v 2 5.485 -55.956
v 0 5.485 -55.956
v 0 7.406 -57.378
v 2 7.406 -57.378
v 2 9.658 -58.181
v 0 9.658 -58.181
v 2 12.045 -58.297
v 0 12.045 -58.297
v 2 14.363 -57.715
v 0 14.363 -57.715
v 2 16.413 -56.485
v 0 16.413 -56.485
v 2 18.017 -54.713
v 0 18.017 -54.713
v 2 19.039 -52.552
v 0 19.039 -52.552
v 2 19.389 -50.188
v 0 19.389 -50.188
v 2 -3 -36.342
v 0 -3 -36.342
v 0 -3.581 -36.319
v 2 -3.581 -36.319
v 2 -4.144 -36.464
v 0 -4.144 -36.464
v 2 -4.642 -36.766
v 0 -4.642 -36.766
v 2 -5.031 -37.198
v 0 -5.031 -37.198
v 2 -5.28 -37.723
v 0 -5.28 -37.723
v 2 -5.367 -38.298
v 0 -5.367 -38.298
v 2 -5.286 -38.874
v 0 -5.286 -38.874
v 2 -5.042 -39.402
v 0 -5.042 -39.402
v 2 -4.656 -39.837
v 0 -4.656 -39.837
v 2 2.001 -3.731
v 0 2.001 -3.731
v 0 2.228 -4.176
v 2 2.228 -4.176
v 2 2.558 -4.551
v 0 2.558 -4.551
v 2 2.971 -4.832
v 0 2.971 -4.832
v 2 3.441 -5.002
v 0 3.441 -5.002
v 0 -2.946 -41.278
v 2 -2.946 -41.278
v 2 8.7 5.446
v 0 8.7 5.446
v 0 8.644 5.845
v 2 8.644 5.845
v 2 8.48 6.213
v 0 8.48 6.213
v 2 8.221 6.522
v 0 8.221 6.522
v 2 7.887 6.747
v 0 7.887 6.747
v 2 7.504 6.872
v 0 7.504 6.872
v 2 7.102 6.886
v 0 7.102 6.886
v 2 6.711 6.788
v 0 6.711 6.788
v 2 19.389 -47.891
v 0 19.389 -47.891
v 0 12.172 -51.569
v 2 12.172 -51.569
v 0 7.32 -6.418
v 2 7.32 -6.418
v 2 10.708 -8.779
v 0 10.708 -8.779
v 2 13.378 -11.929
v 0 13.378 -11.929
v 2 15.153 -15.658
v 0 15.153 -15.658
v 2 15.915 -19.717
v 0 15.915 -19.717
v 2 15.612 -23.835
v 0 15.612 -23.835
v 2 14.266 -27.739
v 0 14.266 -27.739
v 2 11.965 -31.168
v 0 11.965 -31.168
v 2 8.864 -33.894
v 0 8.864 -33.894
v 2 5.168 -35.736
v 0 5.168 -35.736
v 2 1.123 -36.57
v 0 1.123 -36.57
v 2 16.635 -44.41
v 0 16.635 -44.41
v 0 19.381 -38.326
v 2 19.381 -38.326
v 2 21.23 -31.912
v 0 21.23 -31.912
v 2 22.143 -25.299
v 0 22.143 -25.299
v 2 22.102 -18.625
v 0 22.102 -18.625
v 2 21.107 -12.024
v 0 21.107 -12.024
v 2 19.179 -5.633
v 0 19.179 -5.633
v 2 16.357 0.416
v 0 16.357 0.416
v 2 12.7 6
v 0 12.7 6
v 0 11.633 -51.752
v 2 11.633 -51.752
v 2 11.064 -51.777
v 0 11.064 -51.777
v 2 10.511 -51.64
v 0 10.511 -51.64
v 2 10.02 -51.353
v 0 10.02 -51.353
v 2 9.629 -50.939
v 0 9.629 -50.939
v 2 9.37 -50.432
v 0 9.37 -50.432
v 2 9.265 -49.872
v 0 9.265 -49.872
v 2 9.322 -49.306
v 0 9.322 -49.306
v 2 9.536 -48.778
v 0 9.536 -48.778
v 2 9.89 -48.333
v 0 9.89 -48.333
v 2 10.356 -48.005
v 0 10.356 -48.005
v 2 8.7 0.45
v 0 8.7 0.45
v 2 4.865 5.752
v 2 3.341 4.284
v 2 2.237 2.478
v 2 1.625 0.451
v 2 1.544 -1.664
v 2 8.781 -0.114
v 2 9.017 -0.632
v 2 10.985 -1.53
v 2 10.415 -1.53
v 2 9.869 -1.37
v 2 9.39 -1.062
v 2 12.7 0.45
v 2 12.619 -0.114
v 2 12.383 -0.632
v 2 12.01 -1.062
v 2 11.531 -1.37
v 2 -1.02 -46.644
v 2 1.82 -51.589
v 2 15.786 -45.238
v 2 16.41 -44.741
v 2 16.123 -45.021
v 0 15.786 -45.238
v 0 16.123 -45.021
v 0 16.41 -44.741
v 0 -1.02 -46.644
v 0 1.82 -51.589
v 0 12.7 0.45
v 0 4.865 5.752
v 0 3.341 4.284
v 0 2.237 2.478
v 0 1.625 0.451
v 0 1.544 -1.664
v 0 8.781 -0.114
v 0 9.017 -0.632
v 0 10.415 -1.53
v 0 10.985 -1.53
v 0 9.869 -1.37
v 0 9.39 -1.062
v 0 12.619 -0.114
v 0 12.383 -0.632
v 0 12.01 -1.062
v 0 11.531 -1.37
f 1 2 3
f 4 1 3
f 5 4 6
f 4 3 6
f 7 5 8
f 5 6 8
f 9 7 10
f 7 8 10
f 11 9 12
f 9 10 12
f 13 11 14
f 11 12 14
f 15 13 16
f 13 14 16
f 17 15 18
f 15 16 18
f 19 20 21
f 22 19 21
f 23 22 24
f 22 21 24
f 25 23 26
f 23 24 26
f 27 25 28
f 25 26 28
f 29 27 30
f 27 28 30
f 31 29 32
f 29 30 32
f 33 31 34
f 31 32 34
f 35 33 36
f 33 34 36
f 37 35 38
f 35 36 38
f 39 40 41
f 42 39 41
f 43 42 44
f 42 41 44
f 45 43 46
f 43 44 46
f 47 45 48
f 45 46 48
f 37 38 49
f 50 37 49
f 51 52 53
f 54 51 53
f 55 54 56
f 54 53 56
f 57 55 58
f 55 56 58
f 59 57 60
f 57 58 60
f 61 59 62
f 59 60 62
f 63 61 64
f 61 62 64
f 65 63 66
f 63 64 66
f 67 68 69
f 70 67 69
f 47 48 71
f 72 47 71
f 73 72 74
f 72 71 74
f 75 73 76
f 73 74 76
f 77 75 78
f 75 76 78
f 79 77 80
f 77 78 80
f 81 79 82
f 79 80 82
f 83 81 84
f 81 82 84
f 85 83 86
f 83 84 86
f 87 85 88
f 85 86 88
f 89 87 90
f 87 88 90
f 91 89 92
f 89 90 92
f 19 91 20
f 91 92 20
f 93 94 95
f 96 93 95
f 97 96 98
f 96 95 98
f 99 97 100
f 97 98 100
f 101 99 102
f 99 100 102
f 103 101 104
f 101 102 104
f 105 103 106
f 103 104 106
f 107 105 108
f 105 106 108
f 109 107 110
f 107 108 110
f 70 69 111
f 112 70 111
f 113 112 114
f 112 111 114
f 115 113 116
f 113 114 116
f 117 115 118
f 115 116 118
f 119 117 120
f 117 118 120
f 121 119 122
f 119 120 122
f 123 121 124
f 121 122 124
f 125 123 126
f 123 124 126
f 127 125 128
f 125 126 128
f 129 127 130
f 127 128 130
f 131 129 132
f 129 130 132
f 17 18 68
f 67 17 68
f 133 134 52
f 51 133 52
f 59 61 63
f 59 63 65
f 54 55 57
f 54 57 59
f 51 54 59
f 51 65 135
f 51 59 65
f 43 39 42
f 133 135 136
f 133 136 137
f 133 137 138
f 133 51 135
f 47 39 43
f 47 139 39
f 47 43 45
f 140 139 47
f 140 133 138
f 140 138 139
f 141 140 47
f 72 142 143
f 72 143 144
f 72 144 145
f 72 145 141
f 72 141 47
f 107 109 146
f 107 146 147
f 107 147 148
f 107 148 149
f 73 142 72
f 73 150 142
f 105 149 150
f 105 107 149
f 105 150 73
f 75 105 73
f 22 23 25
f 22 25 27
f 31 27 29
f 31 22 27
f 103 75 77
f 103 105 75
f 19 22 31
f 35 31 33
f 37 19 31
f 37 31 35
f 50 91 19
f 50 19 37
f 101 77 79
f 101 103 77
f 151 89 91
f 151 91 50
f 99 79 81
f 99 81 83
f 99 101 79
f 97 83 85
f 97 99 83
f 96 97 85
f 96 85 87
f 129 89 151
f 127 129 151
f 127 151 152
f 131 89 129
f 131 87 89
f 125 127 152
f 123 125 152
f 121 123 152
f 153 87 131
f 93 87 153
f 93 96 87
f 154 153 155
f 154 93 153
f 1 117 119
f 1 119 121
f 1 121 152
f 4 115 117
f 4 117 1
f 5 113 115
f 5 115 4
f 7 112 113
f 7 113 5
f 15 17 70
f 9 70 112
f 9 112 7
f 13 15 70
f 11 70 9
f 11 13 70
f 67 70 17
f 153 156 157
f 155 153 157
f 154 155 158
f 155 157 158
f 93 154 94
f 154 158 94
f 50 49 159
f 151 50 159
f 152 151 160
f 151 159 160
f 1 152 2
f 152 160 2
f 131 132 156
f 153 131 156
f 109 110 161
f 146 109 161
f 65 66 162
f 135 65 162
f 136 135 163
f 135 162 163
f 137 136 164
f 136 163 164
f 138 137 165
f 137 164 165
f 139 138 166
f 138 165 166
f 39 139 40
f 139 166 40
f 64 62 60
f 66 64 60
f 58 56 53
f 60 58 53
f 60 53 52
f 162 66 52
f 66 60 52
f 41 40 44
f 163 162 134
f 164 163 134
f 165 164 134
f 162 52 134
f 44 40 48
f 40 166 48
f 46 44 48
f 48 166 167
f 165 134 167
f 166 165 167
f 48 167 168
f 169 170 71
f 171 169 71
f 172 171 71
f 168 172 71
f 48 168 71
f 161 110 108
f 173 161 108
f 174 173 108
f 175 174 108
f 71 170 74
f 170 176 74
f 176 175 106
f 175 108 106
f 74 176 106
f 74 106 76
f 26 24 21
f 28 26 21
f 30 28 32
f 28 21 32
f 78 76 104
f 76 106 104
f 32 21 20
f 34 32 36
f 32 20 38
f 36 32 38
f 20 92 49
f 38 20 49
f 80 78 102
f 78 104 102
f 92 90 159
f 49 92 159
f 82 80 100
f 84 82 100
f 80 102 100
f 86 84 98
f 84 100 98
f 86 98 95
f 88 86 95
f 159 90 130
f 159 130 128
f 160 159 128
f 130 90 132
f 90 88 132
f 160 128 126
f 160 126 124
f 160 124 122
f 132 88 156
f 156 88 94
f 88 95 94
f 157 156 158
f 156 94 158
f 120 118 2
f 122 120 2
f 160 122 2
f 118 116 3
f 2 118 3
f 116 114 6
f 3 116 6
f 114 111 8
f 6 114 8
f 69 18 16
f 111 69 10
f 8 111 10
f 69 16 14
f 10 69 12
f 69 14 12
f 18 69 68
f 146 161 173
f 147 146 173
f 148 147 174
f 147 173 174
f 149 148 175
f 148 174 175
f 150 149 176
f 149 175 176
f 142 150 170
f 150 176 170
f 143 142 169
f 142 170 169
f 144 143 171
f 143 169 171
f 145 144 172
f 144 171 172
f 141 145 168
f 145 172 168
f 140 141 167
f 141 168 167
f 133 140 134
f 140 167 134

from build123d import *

# Parameters (mm, degrees)
RESSALTO_EXTRUS_O1_DEPTH = 2


with BuildPart() as part:
    # Esboço1 → Ressalto-extrusão1 (new body)
    with BuildSketch(Plane(origin=(0, 0, 0), x_dir=(0, 0, -1), z_dir=(1, 0, 0))):
        with BuildLine():
            Line((47.891048788, 19.389179081), (51.568608211, 12.171562323))
            ThreePointArc((51.568608211, 12.171562323), (50.694576162, 9.481568275), (48.004582114, 10.355600324))
            Line((48.004582114, 10.355600324), (45.23762298, 15.786063389))
            ThreePointArc((45.23762298, 15.786063389), (44.888153026, 16.27331816), (44.409608959, 16.634624175))
            ThreePointArc((44.409608959, 16.634624175), (18.624536688, 22.101585643), (-6, 12.7))
            Line((-6, 12.7), (-0.449608018, 12.7))
            ThreePointArc((-0.449608018, 12.7), (1.550391982, 10.7), (-0.449608018, 8.7))
            Line((-0.449608018, 8.7), (-5.446373062, 8.7))
            ThreePointArc((-5.446373062, 8.7), (-6.646208959, 8.062107753), (-6.788438162, 6.710707165))
            ThreePointArc((-6.788438162, 6.710707165), (-2.477663677, 2.236636341), (3.730763917, 2.001023917))
            ThreePointArc((3.730763917, 2.001023917), (4.55104613, 2.557847644), (5.001705215, 3.440922931))
            ThreePointArc((5.001705215, 3.440922931), (23.834938964, 15.61229456), (36.341556093, -3))
            ThreePointArc((36.341556093, -3), (37.451213604, -5.17490134), (39.837074711, -4.656054149))
            Line((39.837074711, -4.656054149), (41.277742045, -2.945943733))
            ThreePointArc((41.277742045, -2.945943733), (49.179258899, 0.290862483), (55.956453975, 5.485139138))
            ThreePointArc((55.956453975, 5.485139138), (57.714709062, 14.363124933), (50.18816454, 19.389179081))
            Line((50.18816454, 19.389179081), (47.891048788, 19.389179081))
        make_face()
    extrude(amount=RESSALTO_EXTRUS_O1_DEPTH)


solid = part.part
